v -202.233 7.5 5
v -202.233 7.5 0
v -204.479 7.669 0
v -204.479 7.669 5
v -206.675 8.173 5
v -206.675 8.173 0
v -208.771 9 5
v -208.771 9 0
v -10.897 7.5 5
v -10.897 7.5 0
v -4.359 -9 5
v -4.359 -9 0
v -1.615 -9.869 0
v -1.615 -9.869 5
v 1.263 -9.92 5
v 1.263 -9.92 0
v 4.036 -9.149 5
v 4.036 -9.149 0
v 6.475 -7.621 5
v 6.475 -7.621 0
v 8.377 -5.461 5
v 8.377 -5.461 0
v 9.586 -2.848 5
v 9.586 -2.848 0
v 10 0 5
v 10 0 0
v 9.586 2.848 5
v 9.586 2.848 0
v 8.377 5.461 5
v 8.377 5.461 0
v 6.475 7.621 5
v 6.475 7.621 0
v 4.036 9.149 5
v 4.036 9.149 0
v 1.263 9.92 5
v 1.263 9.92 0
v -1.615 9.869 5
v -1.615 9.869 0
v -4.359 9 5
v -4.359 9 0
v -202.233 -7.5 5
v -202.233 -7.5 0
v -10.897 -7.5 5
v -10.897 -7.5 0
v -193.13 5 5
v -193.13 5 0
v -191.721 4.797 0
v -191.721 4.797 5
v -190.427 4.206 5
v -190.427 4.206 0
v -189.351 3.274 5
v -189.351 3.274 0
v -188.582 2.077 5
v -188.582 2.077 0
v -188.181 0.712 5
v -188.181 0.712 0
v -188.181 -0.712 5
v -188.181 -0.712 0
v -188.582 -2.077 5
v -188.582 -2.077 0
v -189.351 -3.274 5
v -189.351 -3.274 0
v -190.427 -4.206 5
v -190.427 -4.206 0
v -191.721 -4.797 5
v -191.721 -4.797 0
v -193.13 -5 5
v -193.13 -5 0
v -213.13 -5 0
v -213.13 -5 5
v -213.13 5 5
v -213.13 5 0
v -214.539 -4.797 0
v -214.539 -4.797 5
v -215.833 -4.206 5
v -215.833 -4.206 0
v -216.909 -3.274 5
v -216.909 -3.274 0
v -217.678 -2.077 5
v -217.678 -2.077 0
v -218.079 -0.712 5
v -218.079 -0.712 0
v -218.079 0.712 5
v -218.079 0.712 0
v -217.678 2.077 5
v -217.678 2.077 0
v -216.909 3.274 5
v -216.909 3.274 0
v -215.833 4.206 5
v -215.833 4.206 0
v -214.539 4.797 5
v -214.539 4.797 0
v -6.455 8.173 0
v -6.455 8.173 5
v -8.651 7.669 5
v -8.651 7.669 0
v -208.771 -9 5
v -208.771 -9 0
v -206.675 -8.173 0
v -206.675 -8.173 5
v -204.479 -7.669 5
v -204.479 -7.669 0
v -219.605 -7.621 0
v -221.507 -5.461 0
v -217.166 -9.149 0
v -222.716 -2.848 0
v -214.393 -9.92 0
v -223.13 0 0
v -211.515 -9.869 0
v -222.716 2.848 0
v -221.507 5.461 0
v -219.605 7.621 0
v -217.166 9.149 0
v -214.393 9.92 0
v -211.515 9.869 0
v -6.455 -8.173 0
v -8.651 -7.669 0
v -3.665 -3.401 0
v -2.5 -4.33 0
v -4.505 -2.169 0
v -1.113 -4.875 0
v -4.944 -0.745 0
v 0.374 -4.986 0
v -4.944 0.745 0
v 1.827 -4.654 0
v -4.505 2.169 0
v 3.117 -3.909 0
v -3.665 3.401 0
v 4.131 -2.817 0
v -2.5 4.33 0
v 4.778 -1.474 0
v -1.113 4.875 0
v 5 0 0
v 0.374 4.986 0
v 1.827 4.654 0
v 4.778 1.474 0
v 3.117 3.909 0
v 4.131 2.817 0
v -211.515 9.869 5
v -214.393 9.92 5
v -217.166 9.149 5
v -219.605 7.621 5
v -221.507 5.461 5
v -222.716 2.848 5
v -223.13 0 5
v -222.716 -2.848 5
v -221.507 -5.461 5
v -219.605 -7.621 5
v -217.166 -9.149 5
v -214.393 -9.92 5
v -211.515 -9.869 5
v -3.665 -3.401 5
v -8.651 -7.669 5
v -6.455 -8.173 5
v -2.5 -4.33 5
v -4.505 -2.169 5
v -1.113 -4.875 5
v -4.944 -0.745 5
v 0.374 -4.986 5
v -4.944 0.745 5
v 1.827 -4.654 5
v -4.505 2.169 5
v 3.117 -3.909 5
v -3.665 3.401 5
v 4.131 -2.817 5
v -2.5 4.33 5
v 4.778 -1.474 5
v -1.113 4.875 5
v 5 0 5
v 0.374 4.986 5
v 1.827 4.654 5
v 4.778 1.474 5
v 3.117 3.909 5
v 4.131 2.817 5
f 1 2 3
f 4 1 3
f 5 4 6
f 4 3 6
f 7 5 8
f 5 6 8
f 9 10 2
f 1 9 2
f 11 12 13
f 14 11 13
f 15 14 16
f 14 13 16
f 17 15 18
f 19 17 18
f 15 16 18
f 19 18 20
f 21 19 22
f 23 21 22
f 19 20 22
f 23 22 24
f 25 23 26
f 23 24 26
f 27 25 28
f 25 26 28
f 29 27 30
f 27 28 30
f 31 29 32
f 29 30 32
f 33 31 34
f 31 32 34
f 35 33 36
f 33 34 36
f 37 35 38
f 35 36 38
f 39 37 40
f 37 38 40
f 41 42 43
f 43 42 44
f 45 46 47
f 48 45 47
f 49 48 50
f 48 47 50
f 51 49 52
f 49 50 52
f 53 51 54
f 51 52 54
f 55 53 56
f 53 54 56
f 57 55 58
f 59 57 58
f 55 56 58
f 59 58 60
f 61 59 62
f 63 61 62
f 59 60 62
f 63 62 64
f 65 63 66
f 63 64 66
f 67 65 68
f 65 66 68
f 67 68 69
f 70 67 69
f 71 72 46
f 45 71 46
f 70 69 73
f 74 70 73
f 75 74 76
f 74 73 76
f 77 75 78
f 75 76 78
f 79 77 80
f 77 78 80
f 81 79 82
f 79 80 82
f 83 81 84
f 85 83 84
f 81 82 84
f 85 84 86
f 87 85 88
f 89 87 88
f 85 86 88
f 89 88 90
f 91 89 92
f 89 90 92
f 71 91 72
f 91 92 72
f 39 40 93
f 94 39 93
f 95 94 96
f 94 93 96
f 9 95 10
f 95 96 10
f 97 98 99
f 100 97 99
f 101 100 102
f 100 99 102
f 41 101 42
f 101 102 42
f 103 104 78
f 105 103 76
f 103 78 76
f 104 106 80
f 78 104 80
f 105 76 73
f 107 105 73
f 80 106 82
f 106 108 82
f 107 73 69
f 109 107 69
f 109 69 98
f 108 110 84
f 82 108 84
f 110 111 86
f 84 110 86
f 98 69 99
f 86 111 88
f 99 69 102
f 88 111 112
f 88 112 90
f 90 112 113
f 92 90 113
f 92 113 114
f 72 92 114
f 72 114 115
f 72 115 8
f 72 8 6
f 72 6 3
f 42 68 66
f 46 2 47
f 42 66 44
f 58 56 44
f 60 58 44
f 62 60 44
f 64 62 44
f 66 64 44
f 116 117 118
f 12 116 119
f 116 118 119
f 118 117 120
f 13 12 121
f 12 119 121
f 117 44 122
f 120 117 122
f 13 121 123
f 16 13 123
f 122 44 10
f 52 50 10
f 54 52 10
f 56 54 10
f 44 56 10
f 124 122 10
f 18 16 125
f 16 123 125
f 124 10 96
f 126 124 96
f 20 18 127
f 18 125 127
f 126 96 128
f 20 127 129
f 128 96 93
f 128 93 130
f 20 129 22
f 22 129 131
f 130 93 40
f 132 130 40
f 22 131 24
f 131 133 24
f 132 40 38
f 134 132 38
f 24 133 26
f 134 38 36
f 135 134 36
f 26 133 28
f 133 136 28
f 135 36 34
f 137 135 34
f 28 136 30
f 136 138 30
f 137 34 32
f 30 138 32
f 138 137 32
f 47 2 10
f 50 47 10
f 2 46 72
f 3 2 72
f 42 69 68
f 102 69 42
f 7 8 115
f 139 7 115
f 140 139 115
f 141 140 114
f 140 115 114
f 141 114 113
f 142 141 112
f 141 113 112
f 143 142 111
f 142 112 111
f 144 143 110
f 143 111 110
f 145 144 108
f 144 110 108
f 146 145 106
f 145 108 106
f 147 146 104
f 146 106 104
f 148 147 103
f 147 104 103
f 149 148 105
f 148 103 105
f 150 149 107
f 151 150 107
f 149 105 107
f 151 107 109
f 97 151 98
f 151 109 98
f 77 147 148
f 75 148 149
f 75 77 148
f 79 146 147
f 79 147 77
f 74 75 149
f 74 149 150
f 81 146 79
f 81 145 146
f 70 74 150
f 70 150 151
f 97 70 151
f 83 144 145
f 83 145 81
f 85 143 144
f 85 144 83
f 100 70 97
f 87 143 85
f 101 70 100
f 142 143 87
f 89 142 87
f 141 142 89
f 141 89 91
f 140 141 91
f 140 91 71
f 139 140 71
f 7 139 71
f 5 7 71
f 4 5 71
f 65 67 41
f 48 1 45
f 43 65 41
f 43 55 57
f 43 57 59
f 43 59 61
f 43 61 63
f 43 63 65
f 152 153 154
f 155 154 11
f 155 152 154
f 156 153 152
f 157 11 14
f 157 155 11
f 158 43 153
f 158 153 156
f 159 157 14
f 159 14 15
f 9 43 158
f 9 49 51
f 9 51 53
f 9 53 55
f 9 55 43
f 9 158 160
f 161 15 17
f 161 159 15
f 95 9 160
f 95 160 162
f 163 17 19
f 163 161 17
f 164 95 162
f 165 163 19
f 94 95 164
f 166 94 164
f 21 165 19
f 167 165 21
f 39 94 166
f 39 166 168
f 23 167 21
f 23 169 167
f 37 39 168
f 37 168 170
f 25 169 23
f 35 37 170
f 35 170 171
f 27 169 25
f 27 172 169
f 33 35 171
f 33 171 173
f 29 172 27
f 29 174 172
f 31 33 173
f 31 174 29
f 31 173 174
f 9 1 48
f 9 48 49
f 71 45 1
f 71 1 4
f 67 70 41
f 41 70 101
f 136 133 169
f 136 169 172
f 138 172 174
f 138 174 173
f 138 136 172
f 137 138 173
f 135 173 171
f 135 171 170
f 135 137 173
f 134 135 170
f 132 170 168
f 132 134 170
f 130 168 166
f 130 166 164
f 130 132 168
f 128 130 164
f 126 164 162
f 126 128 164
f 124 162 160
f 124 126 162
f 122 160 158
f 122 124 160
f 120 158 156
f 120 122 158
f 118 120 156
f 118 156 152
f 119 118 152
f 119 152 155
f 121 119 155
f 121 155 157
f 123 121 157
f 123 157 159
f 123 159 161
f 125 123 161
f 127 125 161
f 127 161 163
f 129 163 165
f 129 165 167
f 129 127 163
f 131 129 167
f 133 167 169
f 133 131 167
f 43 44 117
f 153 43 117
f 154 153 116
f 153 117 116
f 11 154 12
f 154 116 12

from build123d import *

# Parameters (mm, degrees)
SKETCH1_R           = 5
BOSS_EXTRUDE1_DEPTH = 5


with BuildPart() as part:
    # Sketch1 → Boss-Extrude1 (new body)
    with BuildSketch(Plane.XY):
        with BuildLine():
            Line((-202.232752641, -7.5), (-10.897247359, -7.5))
            ThreePointArc((-10.897247359, -7.5), (-7.543145393, -7.879808483), (-4.358898944, -9))
            ThreePointArc((-4.358898944, -9), (10, 0), (-4.358898944, 9))
            ThreePointArc((-4.358898944, 9), (-7.543145393, 7.879808483), (-10.897247359, 7.5))
            Line((-10.897247359, 7.5), (-202.232752641, 7.5))
            ThreePointArc((-202.232752641, 7.5), (-205.586854607, 7.879808483), (-208.771101056, 9))
            ThreePointArc((-208.771101056, 9), (-223.13, 0), (-208.771101056, -9))
            ThreePointArc((-208.771101056, -9), (-205.586854607, -7.879808483), (-202.232752641, -7.5))
        make_face()
        Circle(SKETCH1_R, mode=Mode.SUBTRACT)
        with BuildLine():
            Line((-213.13, 5), (-193.13, 5))
            ThreePointArc((-193.13, 5), (-188.13, 0), (-193.13, -5))
            Line((-193.13, -5), (-213.13, -5))
            ThreePointArc((-213.13, -5), (-218.13, 0), (-213.13, 5))
        make_face(mode=Mode.SUBTRACT)
    extrude(amount=BOSS_EXTRUDE1_DEPTH)


solid = part.part
